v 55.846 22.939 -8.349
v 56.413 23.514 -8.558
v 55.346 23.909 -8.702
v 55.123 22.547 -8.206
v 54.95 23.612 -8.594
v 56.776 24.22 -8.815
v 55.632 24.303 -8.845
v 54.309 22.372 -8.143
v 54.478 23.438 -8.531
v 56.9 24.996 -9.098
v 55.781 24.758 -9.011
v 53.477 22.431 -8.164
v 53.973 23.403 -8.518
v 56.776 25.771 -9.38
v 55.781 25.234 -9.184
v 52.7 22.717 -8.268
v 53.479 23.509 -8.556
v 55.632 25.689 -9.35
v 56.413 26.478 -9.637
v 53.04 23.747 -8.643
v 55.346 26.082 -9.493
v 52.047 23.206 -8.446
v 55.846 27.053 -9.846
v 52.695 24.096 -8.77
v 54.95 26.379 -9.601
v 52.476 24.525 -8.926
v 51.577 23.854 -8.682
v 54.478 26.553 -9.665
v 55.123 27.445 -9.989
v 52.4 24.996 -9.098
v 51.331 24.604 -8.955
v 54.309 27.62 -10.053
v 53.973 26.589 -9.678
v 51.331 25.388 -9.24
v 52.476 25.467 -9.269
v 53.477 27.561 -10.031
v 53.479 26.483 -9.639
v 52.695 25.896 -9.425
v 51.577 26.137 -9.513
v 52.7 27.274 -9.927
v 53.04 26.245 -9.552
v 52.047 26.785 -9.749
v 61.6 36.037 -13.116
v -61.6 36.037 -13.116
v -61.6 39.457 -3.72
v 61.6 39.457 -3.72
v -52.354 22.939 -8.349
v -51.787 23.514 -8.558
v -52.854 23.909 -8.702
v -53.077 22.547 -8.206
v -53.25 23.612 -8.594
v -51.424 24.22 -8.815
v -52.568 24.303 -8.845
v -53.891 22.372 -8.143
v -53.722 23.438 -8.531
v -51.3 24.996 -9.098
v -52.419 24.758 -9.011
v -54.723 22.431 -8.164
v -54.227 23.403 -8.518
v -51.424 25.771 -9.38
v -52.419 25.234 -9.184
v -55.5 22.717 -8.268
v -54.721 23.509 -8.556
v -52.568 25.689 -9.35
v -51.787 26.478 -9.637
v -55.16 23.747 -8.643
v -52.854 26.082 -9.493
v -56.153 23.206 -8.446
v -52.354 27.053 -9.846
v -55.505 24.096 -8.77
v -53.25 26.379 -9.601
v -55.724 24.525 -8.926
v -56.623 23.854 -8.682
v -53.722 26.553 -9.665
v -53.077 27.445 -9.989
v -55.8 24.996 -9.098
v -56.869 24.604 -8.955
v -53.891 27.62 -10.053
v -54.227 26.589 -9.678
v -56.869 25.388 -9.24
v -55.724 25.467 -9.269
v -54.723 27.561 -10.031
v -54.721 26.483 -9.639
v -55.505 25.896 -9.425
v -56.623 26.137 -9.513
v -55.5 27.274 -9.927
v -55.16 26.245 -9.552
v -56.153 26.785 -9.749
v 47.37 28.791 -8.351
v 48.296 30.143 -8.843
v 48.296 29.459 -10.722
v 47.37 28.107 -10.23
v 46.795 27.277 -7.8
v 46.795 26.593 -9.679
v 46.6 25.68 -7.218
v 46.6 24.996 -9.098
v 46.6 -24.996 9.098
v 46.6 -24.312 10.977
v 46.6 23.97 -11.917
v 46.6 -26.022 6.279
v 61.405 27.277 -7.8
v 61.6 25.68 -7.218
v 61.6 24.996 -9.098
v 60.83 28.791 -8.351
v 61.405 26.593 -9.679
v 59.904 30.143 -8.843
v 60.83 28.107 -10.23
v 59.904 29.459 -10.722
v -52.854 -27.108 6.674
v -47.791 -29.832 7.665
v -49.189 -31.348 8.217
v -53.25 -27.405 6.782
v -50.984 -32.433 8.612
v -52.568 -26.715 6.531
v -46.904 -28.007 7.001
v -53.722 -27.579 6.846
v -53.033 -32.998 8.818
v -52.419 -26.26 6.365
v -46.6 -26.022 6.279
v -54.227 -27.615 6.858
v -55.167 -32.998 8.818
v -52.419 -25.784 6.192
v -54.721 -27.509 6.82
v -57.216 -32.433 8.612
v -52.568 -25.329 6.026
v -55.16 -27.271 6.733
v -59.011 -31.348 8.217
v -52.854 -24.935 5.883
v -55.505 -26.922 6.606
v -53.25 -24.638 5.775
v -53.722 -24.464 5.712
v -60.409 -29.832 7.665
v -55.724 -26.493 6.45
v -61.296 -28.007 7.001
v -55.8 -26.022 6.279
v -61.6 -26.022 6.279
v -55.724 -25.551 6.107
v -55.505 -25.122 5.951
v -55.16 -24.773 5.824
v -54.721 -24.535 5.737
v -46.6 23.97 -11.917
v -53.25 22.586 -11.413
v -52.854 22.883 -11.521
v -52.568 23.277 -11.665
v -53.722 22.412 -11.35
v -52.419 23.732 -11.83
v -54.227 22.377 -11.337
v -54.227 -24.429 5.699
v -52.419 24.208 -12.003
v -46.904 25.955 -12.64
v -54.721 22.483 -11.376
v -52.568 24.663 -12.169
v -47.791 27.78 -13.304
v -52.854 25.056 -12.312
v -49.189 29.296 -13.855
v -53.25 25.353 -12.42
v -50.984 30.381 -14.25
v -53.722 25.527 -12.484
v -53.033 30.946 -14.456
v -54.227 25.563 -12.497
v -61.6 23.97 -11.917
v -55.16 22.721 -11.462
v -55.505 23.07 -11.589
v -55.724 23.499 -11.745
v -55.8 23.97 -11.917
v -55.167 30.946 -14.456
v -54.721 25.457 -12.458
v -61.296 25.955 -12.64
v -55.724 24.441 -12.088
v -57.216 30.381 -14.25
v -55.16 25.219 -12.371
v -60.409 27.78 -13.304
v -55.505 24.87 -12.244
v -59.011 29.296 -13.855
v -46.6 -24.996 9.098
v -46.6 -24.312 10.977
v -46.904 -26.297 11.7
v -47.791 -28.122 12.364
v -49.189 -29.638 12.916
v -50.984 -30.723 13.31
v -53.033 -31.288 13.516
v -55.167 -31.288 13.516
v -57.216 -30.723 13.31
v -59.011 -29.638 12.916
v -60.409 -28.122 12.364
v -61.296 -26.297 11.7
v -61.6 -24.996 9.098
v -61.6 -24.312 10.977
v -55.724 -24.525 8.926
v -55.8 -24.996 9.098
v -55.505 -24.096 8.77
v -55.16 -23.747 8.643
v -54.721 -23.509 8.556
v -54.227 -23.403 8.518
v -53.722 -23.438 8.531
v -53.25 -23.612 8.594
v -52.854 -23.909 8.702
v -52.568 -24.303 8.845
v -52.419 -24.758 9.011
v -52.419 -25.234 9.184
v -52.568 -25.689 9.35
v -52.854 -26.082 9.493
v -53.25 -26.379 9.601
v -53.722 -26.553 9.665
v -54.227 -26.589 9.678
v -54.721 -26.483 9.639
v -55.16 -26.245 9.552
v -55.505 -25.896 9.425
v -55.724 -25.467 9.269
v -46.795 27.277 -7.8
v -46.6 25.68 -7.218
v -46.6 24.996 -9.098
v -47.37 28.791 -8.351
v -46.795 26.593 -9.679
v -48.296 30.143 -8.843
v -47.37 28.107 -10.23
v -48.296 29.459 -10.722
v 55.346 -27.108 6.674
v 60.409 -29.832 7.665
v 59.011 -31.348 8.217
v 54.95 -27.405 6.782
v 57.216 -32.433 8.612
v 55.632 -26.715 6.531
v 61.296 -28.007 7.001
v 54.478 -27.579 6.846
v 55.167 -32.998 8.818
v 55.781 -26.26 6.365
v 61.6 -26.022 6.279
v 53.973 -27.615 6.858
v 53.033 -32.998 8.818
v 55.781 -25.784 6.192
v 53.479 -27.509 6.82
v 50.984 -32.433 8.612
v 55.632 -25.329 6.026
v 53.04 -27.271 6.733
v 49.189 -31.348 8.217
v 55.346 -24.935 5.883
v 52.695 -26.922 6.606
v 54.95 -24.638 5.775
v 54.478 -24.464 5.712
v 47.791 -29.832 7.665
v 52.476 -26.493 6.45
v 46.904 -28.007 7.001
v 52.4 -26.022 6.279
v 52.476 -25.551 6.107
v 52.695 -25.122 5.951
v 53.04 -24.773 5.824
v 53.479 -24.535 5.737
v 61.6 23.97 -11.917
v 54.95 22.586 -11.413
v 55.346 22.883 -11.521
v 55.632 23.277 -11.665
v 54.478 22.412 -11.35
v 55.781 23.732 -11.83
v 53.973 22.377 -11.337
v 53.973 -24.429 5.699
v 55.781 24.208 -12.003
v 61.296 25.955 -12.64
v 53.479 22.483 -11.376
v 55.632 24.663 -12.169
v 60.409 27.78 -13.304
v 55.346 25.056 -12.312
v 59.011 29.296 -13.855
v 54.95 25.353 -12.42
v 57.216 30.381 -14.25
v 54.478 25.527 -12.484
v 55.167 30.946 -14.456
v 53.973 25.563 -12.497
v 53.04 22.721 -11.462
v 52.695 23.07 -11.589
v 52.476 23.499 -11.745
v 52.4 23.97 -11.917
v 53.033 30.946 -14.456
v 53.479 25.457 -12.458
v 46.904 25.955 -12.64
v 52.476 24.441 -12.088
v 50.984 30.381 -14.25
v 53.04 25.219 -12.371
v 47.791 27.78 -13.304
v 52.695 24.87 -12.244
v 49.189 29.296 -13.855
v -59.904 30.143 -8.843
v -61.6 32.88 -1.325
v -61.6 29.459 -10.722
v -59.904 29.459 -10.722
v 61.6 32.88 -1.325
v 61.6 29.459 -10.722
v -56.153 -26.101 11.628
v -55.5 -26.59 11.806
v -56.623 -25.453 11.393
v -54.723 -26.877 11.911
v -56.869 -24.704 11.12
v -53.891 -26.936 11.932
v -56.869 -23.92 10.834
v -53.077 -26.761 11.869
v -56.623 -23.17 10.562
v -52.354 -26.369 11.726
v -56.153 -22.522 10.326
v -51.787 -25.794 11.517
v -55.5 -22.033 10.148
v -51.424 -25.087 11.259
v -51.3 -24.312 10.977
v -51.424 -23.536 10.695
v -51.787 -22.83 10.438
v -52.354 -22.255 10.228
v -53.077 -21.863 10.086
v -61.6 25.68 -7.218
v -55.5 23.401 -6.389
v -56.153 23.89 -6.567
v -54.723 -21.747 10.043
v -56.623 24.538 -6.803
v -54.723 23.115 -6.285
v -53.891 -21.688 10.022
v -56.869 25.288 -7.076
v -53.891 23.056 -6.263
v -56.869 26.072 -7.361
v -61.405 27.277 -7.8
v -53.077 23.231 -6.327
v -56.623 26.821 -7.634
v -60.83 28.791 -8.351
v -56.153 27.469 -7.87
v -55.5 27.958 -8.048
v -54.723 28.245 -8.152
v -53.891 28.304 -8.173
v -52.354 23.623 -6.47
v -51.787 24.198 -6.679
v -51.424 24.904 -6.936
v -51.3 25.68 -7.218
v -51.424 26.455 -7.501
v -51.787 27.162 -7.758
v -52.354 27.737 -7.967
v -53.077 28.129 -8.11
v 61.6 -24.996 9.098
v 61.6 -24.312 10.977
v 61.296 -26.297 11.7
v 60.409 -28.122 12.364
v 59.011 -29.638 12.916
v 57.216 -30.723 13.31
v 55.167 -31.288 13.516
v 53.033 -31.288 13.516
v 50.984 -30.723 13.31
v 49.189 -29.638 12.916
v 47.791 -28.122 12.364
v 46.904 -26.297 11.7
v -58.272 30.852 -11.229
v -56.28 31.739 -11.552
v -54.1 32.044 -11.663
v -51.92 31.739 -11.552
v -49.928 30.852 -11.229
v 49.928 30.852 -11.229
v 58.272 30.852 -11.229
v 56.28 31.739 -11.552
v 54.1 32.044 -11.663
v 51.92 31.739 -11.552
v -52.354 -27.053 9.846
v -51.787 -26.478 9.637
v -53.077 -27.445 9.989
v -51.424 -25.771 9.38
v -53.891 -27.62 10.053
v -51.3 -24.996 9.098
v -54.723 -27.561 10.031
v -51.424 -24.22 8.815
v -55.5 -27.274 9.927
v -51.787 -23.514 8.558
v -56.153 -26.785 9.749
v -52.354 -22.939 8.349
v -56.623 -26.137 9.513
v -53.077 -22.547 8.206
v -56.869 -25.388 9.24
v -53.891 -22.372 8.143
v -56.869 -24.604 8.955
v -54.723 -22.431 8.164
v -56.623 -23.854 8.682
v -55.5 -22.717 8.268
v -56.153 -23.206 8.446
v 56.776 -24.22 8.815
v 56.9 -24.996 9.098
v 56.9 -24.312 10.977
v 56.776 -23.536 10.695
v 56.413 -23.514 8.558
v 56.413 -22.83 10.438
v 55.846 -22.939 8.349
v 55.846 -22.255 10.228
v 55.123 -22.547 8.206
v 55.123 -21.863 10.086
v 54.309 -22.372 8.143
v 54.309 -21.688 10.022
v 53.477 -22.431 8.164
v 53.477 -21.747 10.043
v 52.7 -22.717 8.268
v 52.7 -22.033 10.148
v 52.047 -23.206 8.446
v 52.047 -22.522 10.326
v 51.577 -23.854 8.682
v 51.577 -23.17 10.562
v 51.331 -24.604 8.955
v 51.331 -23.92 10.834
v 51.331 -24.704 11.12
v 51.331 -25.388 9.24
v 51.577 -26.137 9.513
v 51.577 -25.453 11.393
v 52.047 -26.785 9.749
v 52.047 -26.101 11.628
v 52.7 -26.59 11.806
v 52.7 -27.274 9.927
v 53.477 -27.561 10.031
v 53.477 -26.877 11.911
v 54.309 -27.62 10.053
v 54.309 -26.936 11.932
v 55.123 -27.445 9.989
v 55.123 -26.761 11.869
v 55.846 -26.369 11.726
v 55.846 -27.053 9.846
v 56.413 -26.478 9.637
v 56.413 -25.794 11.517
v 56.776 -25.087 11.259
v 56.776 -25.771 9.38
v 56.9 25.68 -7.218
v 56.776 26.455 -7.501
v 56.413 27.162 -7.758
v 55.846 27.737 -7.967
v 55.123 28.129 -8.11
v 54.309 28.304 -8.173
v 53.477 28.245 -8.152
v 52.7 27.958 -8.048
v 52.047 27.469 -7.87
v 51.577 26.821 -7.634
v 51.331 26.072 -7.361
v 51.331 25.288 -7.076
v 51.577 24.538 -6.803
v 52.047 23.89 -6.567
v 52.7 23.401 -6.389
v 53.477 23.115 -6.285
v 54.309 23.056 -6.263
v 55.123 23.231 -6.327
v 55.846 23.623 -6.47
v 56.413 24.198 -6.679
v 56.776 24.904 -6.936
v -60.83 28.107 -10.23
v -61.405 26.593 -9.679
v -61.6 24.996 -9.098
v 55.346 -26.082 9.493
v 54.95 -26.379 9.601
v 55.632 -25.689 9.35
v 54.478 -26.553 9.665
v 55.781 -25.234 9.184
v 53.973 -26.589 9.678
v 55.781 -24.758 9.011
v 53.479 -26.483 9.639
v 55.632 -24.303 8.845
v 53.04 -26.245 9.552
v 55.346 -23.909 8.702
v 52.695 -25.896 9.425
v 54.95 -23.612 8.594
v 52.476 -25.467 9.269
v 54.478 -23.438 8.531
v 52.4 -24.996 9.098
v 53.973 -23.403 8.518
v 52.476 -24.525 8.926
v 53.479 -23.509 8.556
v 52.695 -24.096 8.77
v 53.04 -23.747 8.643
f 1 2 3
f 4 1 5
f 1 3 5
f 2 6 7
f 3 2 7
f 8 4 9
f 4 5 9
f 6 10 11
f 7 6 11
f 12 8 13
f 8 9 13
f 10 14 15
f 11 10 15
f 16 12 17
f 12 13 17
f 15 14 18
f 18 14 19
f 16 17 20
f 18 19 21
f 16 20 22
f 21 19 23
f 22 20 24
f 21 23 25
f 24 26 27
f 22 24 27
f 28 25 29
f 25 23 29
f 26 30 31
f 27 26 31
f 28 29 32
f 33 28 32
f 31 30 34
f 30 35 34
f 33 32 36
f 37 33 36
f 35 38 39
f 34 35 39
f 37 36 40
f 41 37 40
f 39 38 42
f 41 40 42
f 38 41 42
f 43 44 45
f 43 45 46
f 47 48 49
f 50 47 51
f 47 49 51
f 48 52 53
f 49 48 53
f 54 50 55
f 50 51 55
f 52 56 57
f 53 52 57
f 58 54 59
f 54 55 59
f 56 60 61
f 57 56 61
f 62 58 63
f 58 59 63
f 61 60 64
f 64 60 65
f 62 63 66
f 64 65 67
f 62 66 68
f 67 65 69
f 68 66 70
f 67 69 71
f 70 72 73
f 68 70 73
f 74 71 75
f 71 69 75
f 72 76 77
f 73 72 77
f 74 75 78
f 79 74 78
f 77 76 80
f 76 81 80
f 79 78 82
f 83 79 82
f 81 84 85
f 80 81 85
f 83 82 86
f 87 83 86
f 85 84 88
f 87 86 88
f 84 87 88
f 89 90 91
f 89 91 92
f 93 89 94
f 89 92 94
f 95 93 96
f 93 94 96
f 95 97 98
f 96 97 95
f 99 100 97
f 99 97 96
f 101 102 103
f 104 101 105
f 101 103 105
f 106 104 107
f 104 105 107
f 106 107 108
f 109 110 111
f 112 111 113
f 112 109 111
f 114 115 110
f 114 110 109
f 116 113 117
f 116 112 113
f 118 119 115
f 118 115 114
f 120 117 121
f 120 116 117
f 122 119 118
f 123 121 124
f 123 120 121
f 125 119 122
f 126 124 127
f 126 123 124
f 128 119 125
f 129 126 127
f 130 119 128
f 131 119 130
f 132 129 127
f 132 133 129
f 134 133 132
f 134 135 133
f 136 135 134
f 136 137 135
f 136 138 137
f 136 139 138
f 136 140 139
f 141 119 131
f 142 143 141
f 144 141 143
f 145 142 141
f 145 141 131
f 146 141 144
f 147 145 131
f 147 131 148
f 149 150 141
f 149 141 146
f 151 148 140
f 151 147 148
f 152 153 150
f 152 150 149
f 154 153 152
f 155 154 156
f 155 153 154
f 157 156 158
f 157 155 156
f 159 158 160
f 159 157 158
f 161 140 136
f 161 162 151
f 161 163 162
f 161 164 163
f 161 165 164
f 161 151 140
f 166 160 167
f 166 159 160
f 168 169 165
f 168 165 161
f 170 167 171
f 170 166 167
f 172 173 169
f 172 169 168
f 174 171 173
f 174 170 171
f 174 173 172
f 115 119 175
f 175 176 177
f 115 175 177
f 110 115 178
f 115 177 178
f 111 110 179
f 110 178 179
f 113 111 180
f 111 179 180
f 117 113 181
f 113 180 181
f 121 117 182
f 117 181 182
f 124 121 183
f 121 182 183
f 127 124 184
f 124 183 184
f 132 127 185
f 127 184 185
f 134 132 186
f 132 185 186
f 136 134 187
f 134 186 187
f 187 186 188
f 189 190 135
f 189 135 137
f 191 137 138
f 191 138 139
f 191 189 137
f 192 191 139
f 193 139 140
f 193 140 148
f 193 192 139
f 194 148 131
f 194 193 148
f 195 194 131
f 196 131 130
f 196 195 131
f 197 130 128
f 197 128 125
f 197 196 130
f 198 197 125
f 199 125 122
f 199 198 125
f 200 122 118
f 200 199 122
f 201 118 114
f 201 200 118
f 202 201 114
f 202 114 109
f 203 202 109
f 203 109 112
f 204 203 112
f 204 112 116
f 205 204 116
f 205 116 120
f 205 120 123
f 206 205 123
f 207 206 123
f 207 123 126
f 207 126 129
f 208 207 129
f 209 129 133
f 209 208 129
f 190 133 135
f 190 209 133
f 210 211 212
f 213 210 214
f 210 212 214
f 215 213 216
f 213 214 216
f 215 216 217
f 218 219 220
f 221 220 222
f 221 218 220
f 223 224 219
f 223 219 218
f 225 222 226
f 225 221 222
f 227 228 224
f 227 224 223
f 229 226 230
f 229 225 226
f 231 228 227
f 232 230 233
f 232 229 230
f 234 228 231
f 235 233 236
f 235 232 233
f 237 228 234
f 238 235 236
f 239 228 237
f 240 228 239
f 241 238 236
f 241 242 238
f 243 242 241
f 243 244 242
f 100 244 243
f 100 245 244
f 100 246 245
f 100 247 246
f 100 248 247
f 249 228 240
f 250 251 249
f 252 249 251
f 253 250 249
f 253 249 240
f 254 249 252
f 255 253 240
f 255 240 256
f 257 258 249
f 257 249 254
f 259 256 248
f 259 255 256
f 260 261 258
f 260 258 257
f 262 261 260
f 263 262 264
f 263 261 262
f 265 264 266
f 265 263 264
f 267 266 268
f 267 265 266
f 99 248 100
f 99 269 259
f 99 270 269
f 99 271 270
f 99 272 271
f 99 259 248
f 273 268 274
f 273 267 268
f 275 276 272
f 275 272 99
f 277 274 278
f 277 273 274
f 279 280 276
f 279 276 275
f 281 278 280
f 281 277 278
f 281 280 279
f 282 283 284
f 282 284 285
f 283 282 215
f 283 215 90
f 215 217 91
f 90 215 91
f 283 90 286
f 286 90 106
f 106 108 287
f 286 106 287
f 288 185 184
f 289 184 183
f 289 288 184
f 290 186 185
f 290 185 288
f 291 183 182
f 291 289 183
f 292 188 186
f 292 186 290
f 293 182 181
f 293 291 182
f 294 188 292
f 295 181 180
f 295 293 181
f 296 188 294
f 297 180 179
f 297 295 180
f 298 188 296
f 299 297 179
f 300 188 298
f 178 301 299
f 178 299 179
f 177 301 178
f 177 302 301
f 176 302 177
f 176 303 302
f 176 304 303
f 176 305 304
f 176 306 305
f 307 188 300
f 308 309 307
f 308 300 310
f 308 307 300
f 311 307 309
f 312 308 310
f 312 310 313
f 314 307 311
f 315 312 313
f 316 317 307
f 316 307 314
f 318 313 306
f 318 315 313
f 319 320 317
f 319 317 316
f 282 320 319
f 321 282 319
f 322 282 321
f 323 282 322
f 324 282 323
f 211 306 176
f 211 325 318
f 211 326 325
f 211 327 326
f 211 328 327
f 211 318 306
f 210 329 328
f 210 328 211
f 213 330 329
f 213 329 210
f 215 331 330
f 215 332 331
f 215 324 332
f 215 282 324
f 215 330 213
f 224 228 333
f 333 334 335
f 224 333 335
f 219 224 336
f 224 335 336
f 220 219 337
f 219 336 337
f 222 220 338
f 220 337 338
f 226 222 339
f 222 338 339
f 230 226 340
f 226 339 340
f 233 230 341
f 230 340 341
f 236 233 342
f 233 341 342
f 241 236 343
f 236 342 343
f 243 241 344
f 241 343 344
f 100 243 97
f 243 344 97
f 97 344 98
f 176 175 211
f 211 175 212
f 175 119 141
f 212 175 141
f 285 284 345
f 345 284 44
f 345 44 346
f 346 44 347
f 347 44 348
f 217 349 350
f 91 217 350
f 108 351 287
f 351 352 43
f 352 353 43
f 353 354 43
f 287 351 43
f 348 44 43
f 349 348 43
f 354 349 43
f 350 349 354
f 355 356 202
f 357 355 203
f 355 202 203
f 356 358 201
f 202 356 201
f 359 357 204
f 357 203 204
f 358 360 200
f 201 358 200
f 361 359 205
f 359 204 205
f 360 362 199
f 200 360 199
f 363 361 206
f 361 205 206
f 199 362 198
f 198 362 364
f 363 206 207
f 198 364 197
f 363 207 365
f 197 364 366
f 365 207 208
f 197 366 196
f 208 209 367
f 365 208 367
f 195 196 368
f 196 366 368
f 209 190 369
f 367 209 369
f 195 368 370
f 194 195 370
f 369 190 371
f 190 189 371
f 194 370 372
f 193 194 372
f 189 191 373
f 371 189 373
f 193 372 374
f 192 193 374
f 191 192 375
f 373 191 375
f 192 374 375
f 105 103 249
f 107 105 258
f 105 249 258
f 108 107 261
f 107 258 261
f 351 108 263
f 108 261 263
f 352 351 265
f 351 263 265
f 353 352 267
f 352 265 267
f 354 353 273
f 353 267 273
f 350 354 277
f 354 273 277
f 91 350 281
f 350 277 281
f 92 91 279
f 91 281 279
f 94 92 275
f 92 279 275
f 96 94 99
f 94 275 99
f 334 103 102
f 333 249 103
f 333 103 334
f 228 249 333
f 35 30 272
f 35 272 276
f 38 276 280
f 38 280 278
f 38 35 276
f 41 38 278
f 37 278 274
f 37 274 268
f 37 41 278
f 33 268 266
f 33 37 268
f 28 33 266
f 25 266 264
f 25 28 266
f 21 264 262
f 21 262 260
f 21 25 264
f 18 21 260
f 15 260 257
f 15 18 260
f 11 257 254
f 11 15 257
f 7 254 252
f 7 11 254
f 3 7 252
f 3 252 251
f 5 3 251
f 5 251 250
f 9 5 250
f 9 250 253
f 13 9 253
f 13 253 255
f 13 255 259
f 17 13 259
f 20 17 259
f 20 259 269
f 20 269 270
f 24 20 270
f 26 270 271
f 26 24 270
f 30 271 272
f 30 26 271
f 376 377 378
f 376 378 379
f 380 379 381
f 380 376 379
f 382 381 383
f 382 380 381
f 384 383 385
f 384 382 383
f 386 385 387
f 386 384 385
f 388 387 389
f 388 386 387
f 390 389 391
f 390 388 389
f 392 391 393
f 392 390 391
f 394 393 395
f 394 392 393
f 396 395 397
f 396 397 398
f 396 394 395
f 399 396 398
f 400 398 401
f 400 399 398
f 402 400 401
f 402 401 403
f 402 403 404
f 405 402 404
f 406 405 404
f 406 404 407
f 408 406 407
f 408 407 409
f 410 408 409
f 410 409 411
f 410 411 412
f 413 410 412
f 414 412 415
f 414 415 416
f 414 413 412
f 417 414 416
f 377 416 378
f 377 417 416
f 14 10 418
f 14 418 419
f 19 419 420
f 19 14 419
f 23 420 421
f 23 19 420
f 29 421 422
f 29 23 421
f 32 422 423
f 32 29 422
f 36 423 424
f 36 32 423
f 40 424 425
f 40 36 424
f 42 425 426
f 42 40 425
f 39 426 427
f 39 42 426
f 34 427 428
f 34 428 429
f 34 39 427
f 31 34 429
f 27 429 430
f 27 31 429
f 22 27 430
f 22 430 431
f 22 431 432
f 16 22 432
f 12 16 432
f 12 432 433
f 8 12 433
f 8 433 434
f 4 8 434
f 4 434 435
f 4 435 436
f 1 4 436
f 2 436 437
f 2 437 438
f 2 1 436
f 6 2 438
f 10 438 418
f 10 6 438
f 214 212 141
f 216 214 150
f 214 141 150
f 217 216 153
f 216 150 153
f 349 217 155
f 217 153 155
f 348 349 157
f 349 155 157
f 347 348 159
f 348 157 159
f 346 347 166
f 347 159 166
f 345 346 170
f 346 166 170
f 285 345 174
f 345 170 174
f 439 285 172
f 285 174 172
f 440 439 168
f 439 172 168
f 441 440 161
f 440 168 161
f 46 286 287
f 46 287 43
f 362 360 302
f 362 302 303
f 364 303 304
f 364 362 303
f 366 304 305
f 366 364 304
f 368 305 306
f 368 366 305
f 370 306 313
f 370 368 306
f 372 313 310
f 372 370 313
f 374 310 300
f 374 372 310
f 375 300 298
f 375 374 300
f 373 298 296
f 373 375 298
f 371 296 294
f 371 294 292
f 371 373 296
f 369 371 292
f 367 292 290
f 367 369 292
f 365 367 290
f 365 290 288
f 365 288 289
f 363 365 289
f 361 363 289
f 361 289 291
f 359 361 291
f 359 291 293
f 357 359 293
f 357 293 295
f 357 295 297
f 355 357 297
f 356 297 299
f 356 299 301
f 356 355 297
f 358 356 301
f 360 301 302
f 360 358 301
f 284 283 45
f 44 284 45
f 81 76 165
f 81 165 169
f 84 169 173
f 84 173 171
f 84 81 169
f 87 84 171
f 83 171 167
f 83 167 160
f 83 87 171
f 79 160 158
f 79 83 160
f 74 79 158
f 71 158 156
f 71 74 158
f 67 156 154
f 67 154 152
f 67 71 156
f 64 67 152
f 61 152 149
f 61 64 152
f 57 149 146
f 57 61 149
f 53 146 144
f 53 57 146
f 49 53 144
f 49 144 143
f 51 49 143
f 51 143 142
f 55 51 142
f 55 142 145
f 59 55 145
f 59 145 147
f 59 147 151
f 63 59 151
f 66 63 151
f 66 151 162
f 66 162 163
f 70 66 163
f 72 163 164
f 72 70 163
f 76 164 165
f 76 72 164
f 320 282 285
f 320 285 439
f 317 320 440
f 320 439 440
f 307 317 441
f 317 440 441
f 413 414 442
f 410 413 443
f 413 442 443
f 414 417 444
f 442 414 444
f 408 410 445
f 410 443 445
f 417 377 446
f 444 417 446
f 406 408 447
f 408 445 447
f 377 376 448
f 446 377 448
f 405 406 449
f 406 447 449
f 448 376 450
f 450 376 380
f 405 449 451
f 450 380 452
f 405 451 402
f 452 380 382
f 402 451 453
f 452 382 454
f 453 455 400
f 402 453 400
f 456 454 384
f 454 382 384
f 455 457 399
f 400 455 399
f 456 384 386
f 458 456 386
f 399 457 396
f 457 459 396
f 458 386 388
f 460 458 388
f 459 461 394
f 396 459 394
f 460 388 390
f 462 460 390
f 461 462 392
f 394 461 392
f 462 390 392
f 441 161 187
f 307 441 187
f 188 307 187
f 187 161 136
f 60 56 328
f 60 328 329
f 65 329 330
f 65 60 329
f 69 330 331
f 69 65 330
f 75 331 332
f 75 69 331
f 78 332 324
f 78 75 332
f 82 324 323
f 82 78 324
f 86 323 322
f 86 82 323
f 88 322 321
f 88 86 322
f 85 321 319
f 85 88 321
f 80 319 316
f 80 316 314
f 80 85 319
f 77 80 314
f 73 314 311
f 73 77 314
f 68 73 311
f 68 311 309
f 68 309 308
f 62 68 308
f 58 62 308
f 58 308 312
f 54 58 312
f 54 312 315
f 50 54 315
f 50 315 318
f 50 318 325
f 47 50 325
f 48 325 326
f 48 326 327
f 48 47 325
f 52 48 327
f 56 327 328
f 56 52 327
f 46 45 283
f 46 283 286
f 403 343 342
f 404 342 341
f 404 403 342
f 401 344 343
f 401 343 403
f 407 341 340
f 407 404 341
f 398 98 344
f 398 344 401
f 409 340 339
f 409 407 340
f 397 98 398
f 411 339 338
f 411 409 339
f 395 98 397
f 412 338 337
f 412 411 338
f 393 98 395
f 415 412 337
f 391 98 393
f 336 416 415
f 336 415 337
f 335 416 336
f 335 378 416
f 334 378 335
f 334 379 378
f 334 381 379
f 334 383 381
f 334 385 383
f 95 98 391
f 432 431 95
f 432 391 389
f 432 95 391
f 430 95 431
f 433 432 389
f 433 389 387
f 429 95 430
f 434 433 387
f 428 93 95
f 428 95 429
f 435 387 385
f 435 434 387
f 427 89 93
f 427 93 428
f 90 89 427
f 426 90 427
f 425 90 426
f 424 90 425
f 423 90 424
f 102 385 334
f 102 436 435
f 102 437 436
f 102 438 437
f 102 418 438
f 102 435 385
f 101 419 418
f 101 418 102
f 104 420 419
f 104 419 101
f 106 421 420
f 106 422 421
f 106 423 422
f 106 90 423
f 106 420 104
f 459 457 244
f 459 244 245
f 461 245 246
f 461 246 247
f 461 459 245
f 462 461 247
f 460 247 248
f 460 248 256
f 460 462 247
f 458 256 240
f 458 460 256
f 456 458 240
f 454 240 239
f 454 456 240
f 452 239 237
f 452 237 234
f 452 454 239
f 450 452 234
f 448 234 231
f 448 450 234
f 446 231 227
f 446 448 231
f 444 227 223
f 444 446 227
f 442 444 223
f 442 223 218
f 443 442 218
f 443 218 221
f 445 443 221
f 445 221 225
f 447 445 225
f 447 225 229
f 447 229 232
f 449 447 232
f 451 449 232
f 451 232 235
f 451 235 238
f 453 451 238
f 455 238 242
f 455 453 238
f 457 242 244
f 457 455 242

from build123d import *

# Parameters (mm, degrees)
ESQUISSE3_R          = 7.5
ESQUISSE3_R_2        = 2.8
BOSS_EXTRU_1_DEPTH   = 2
BOSS_EXTRU_1_2_DEPTH = 2
BOSS_EXTRU_1_3_DEPTH = 2
BOSS_EXTRU_1_4_DEPTH = 2
ESQUISSE4_R          = 7.5
ESQUISSE4_R_2        = 1.7
BOSS_EXTRU_2_DEPTH   = 3
BOSS_EXTRU_3_DEPTH   = 5
BOSS_EXTRU_4_START   = -2
ESQUISSE6_W          = 123.2
ESQUISSE6_H          = 7
BOSS_EXTRU_4_DEPTH   = 10


with BuildPart() as part:
    # Esquisse3 → Boss.-Extru.1 (new body)
    with BuildSketch(Plane(origin=(0, 0, 0), x_dir=(1, 0, 0), z_dir=(0, 0.342020143, 0.939692621))):
        with Locations((-54.1, 26.6)):
            Circle(ESQUISSE3_R)
        with Locations((-54.1, 26.6)):
            Circle(ESQUISSE3_R_2, mode=Mode.SUBTRACT)
    extrude(amount=BOSS_EXTRU_1_DEPTH)



with BuildPart() as body_2:
    # Esquisse3 → Boss.-Extru.1 2 (new body)
    with BuildSketch(Plane(origin=(0, 0, 0), x_dir=(1, 0, 0), z_dir=(0, 0.342020143, 0.939692621))):
        with Locations((54.1, 26.6)):
            Circle(ESQUISSE3_R)
        with Locations((54.1, 26.6)):
            Circle(ESQUISSE3_R_2, mode=Mode.SUBTRACT)
    extrude(amount=BOSS_EXTRU_1_2_DEPTH)


with BuildPart() as body_3:
    # Esquisse3 → Boss.-Extru.1 3 (new body)
    with BuildSketch(Plane(origin=(0, 0, 0), x_dir=(1, 0, 0), z_dir=(0, 0.342020143, 0.939692621))):
        with Locations((54.1, -26.6)):
            Circle(ESQUISSE3_R)
        with Locations((54.1, -26.6)):
            Circle(ESQUISSE3_R_2, mode=Mode.SUBTRACT)
    extrude(amount=BOSS_EXTRU_1_3_DEPTH)


with BuildPart() as body_4:
    # Esquisse3 → Boss.-Extru.1 4 (new body)
    with BuildSketch(Plane(origin=(0, 0, 0), x_dir=(1, 0, 0), z_dir=(0, 0.342020143, 0.939692621))):
        with Locations((-54.1, -26.6)):
            Circle(ESQUISSE3_R)
        with Locations((-54.1, -26.6)):
            Circle(ESQUISSE3_R_2, mode=Mode.SUBTRACT)
    extrude(amount=BOSS_EXTRU_1_4_DEPTH)


with BuildPart() as part_1:
    add(part.part)

    add(body_2.part)  # Boss.-Extru.2 merges body 2

    add(body_3.part)  # Boss.-Extru.2 merges body 3

    add(body_4.part)  # Boss.-Extru.2 merges body 4
    # Esquisse4 → Boss.-Extru.2 (add)
    with BuildSketch(Plane(origin=(0, 0, 0), x_dir=(-1, 0, 0), z_dir=(0, -0.342020143, -0.939692621))):
        with Locations((-54.1, 26.6)):
            Circle(ESQUISSE4_R)
        with Locations((-54.1, 26.6)):
            Circle(ESQUISSE4_R_2, mode=Mode.SUBTRACT)
        with Locations((54.1, 26.6)):
            Circle(ESQUISSE4_R)
        with Locations((54.1, 26.6)):
            Circle(ESQUISSE4_R_2, mode=Mode.SUBTRACT)
        with Locations((54.1, -26.6)):
            Circle(ESQUISSE4_R)
        with Locations((54.1, -26.6)):
            Circle(ESQUISSE4_R_2, mode=Mode.SUBTRACT)
        with Locations((-54.1, -26.6)):
            Circle(ESQUISSE4_R)
        with Locations((-54.1, -26.6)):
            Circle(ESQUISSE4_R_2, mode=Mode.SUBTRACT)
    extrude(amount=BOSS_EXTRU_2_DEPTH)

    # Esquisse5 → Boss.-Extru.3 (add)
    with BuildSketch(Plane(origin=(0, -1.02606043, -2.819077862), x_dir=(-1, 0, 0), z_dir=(0, -0.342020143, -0.939692621))):
        with BuildLine():
            Line((-61.6, 26.6), (-61.6, -26.6))
            ThreePointArc((-61.6, -26.6), (-54.1, -19.1), (-46.6, -26.6))
            Line((-46.6, -26.6), (-46.6, 26.6))
            ThreePointArc((-46.6, 26.6), (-54.1, 19.1), (-61.6, 26.6))
        make_face()
        with BuildLine():
            Line((61.6, 26.6), (61.6, -26.6))
            ThreePointArc((61.6, -26.6), (54.1, -19.1), (46.6, -26.6))
            Line((46.6, -26.6), (46.6, 26.6))
            ThreePointArc((46.6, 26.6), (54.1, 19.1), (61.6, 26.6))
        make_face()
    extrude(amount=-BOSS_EXTRU_3_DEPTH)

    # Esquisse6 → Boss.-Extru.4 (add)
    with BuildSketch(Plane(origin=(0, 0.684040287, 1.879385242), x_dir=(1, 0, 0), z_dir=(0, 0.342020143, 0.939692621)).offset(BOSS_EXTRU_4_START)):
        with Locations((0, 34.85)):
            Rectangle(ESQUISSE6_W, ESQUISSE6_H)
    extrude(amount=BOSS_EXTRU_4_DEPTH)


solid = part_1.part
